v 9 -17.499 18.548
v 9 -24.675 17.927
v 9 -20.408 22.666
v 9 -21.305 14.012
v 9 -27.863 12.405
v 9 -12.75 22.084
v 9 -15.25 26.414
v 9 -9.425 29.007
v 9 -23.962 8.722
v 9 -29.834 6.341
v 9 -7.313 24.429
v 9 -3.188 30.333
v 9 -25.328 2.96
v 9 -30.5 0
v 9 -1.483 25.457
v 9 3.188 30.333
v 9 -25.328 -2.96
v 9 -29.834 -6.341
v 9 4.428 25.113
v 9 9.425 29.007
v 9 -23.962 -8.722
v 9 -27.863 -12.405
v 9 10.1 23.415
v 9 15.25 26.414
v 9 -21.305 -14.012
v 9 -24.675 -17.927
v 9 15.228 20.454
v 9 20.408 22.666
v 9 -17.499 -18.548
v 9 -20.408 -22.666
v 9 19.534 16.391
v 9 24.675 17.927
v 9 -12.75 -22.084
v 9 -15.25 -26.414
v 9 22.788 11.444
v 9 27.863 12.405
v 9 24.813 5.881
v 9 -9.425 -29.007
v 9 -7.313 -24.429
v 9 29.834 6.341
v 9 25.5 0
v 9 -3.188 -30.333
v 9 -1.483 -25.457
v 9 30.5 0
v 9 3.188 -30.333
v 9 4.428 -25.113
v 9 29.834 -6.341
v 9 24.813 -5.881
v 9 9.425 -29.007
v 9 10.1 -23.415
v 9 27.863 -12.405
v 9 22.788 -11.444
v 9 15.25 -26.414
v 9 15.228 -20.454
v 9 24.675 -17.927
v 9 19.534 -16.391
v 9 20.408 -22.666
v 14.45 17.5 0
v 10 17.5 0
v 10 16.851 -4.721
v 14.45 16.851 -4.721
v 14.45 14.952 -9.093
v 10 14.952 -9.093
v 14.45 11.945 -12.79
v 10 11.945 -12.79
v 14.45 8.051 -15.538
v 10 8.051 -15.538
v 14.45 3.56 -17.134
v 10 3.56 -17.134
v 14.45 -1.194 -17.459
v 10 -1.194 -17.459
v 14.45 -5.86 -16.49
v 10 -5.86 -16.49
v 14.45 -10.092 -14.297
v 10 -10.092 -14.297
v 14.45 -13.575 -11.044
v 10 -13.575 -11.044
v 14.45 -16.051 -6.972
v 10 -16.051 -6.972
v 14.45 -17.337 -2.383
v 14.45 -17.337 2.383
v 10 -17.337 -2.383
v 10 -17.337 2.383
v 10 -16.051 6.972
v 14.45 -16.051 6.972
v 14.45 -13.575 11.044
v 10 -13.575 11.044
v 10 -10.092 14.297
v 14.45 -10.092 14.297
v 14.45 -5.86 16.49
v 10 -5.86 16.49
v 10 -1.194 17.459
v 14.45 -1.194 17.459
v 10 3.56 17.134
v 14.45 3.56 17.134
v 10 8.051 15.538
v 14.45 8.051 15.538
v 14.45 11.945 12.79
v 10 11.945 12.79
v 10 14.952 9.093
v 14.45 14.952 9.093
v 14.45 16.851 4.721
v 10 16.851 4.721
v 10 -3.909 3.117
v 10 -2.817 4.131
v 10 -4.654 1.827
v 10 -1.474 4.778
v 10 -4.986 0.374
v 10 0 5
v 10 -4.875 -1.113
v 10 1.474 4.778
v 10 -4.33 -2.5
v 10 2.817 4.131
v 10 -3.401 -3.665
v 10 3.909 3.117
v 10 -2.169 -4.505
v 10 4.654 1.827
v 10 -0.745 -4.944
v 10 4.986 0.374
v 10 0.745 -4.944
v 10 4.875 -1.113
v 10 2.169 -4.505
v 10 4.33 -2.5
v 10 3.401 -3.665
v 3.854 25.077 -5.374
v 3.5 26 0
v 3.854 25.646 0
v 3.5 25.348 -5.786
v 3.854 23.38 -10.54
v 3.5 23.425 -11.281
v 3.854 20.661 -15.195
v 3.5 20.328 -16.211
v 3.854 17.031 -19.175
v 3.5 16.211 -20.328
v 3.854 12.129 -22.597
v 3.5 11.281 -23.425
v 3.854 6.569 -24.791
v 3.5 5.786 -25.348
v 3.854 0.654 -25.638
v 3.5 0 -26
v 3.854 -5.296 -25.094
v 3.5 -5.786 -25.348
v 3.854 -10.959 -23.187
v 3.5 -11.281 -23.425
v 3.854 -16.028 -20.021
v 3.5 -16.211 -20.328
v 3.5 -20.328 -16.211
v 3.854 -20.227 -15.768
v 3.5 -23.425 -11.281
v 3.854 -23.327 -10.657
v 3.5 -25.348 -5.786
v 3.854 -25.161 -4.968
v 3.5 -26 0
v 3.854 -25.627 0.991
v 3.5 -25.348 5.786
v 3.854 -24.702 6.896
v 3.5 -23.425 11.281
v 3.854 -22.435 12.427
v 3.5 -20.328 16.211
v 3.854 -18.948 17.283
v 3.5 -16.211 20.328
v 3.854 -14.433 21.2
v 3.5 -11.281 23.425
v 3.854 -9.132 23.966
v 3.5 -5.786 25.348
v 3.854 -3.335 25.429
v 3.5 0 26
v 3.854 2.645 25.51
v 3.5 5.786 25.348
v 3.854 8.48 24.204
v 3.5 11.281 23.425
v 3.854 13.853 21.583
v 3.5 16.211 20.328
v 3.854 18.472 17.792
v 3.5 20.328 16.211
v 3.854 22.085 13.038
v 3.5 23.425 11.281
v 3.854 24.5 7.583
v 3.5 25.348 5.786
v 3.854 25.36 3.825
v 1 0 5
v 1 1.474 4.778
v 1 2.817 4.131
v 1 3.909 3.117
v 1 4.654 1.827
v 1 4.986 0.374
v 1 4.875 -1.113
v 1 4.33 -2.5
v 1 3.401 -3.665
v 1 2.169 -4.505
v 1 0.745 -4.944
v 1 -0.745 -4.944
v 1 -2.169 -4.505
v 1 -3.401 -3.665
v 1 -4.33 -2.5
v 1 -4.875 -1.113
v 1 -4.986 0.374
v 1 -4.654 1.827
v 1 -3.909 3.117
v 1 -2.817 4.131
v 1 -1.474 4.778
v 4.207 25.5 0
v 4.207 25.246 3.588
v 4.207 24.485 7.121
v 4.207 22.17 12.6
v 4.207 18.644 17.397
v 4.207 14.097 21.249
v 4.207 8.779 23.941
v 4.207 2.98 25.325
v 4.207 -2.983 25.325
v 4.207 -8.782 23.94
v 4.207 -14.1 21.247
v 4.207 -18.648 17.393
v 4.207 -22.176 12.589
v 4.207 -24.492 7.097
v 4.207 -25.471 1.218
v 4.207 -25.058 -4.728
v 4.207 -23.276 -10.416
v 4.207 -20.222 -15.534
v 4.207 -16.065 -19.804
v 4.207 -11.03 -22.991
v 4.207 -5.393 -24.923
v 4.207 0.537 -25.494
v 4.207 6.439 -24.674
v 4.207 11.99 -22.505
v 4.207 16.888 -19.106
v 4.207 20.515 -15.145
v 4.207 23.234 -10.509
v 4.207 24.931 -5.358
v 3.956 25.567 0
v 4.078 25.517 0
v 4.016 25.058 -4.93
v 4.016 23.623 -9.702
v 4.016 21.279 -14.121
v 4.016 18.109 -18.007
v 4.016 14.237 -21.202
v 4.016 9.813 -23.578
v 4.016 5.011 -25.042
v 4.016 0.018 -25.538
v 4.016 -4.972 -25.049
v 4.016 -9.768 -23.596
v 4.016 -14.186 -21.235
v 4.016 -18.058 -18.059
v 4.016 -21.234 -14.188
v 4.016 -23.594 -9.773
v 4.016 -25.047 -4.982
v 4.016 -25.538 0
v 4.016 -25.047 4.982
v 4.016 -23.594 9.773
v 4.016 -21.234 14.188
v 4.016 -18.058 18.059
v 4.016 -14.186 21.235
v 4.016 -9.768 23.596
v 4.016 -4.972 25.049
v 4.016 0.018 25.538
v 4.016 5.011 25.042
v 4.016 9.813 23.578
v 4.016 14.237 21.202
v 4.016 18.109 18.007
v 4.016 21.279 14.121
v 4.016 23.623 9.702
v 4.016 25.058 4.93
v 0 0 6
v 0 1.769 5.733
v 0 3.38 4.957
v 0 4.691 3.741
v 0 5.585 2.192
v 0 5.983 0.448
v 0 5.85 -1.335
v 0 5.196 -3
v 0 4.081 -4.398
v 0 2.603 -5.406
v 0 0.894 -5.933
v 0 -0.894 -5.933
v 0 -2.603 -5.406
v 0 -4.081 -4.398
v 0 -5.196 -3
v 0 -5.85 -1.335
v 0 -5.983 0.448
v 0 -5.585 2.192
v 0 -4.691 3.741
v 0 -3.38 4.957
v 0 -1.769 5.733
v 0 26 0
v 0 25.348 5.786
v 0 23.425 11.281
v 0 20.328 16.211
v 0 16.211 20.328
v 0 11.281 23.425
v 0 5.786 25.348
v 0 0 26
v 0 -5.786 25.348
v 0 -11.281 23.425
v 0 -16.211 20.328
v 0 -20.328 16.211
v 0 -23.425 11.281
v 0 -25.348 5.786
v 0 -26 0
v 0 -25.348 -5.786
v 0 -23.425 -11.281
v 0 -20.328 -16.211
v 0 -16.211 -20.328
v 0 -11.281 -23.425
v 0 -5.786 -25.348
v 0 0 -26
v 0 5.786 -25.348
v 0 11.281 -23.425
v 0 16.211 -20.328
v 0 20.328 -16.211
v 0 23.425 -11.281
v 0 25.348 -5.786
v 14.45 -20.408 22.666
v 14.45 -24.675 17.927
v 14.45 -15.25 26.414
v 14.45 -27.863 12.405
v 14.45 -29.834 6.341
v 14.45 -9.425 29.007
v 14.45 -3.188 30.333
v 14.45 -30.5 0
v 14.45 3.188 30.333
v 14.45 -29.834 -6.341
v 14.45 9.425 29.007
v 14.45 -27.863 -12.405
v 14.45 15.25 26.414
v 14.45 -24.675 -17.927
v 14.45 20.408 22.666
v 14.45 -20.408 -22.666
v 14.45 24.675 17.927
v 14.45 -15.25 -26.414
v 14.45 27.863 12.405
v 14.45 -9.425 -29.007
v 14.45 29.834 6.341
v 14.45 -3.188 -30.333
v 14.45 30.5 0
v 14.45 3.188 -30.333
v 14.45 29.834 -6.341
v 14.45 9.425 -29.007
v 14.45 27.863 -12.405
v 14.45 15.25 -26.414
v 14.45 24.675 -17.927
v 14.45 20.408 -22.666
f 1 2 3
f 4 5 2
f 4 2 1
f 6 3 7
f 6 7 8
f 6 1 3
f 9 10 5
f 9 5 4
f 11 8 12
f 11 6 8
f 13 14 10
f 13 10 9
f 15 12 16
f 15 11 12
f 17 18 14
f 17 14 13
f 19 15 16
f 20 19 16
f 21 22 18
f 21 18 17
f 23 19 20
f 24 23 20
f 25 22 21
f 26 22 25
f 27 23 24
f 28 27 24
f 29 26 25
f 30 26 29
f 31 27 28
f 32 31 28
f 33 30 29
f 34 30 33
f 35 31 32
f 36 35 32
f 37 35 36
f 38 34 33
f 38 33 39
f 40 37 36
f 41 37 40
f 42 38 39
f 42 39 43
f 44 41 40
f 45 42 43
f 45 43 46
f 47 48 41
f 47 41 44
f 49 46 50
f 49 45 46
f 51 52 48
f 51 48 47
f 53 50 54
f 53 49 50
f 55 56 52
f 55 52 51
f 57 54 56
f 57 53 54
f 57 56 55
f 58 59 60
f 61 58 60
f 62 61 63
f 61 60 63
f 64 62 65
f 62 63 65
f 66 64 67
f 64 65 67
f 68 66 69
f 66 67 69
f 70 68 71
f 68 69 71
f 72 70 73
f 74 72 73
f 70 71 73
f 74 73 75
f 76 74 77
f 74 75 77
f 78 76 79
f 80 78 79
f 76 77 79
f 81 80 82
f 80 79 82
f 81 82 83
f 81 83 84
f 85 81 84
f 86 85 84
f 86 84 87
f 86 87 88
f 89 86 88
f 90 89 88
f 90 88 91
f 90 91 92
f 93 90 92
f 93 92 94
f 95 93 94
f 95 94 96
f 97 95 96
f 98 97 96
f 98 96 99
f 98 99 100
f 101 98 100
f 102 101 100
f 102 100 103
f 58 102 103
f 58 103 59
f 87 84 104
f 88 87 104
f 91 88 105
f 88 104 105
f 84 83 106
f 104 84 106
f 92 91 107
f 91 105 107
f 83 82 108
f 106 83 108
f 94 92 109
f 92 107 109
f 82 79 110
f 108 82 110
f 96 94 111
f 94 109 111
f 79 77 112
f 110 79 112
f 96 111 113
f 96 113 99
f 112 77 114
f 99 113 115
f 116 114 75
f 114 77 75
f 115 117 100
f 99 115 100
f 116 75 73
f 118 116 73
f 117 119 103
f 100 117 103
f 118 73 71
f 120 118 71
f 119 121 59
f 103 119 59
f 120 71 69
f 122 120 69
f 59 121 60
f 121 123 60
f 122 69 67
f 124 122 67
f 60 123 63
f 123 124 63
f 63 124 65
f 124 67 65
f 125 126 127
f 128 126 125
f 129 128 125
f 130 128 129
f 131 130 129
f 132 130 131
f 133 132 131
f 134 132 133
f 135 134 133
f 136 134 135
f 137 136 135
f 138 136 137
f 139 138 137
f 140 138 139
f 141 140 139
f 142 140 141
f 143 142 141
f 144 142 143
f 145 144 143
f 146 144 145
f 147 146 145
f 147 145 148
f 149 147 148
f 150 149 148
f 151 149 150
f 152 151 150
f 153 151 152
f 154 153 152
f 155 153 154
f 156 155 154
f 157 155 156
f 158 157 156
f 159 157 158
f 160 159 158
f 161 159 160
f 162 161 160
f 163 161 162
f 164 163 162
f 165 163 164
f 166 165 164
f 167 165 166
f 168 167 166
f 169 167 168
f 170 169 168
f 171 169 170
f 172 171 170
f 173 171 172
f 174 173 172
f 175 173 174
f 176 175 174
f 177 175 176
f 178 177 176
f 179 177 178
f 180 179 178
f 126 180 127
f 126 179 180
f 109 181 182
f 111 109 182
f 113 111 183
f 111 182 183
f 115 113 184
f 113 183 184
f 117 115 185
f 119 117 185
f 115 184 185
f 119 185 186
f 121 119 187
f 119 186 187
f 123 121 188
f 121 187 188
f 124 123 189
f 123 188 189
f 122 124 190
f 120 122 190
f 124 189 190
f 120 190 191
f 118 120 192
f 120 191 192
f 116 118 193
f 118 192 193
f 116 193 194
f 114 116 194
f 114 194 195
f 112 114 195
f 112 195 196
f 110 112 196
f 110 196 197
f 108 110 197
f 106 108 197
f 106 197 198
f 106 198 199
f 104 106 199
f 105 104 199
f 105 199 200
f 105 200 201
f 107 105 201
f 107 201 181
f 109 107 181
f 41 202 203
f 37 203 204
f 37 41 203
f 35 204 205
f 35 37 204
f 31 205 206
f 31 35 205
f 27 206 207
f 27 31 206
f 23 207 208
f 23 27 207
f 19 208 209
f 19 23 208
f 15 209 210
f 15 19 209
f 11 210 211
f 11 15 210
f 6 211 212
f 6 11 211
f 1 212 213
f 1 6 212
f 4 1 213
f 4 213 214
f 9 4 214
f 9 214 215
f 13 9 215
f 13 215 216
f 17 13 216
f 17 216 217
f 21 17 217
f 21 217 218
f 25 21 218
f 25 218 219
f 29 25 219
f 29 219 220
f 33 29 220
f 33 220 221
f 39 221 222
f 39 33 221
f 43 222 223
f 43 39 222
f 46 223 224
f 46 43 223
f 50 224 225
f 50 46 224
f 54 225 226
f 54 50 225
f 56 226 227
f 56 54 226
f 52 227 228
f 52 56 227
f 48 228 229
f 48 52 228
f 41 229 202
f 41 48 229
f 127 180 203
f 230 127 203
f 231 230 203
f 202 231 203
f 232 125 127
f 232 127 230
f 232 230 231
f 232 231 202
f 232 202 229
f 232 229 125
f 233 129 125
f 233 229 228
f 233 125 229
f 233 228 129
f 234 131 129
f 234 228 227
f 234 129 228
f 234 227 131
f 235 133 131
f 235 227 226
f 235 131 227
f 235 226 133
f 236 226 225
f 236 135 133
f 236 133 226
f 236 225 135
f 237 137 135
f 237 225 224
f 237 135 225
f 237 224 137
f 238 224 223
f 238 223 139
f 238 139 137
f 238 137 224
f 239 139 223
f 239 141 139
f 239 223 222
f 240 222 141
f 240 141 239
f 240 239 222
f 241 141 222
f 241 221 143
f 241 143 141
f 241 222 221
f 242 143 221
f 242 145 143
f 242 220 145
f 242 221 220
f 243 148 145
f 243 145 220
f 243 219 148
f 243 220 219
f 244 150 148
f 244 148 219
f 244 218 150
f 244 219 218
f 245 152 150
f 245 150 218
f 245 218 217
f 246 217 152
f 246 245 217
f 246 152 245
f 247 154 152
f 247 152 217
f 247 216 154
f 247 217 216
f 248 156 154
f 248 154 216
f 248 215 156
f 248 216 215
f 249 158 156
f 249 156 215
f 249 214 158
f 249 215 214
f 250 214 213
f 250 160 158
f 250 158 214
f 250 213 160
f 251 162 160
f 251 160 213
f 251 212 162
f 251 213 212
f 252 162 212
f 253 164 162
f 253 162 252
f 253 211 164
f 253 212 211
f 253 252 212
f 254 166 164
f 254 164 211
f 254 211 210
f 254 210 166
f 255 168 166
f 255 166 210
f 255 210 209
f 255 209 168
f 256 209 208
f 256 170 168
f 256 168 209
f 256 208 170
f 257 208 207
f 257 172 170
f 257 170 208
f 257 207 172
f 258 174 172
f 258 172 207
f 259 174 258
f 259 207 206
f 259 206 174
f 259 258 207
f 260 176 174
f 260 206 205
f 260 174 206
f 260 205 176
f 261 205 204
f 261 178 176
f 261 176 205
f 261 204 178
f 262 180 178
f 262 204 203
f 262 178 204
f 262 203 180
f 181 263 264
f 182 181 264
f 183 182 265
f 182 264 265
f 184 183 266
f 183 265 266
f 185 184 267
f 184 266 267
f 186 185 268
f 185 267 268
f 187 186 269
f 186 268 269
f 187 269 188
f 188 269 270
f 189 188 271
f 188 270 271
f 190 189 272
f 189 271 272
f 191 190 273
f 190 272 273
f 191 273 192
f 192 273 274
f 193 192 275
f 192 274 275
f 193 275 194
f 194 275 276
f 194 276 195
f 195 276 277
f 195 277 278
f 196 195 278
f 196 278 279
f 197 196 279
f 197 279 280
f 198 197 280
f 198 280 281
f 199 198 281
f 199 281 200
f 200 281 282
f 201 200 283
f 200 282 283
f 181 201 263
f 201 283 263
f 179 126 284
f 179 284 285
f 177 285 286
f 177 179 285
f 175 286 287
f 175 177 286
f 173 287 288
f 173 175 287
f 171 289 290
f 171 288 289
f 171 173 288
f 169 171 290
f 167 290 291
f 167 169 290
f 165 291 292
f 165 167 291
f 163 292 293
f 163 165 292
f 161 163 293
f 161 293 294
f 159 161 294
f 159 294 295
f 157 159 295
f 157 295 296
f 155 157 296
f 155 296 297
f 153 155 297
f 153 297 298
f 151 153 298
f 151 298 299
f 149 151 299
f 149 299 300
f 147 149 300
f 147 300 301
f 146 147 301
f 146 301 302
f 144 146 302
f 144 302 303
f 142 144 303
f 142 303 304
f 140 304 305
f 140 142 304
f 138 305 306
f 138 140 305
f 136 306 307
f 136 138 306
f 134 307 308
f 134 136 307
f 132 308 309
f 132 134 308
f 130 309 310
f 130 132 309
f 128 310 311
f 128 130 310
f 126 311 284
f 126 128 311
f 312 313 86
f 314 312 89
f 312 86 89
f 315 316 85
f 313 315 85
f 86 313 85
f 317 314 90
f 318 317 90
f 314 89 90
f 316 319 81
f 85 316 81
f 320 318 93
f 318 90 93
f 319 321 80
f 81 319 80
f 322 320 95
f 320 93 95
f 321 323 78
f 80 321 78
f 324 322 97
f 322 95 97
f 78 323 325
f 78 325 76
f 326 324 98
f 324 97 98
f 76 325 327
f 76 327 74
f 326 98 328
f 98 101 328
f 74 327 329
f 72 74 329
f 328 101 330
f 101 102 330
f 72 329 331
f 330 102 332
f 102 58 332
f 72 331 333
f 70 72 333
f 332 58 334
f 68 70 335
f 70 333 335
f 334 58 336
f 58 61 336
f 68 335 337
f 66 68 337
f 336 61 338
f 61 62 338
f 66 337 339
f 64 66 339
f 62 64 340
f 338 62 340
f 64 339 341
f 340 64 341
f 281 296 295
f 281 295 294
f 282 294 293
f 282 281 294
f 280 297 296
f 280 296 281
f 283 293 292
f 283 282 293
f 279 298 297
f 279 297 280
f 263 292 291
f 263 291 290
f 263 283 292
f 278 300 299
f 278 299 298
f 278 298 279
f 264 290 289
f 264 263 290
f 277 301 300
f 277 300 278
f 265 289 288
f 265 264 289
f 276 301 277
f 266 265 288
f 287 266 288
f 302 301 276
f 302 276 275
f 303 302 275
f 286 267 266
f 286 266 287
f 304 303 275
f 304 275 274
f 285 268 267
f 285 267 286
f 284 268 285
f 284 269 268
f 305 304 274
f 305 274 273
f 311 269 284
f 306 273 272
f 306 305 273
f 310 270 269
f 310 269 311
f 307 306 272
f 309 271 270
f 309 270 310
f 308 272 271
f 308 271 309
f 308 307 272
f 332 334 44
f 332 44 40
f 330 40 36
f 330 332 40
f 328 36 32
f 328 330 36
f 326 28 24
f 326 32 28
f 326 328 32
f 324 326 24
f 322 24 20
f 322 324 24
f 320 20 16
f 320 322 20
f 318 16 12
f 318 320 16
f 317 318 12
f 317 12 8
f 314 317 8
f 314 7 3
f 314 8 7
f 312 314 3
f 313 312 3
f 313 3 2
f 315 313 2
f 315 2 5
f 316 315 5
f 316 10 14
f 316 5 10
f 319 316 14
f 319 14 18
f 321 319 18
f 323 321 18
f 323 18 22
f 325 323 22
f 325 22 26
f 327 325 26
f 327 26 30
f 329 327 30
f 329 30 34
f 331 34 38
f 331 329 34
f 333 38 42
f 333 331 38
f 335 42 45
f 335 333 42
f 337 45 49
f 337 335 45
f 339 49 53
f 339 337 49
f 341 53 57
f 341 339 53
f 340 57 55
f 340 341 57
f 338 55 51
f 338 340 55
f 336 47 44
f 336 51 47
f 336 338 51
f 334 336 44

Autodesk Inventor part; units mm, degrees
ref_plane "YZ Plane" through (0, 0, 0) normal (1, 0, 0) x (0, 1, 0)
ref_plane "XZ Plane" through (0, 0, 0) normal (0, 1, 0) x (-1, 0, 0)
ref_plane "XY Plane" through (0, 0, 0) normal (0, 0, 1) x (1, 0, 0)
sketch "Эскиз1" plane through (0, 0, 0) normal (0, 0, 1) x (1, 0, 0)
  line L0 (0, 0) -> (0, 26)
  line L1 (9, 26.1456) -> (9, 30.5)
  line L2 (9, 30.5) -> (14.45, 30.5)
  line L3 (14.45, 30.5) -> (14.45, 17.5)
  line L4 (14.45, 17.5) -> (10, 17.5)
  line L5 (10, 17.5) -> (10, 0)
  line L6 (10, 0) -> (0, 0)
  line L7 (0, 26) -> (3.5, 26)
  line L8 (3.5, 26) -> (4, 25.5)
  line L9 (4, 25.5) -> (9, 25.5)
  line L10 (9, 25.5) -> (9, 26.1456)
  dimension "d1" = 52
  dimension "d2" = 0.5
  dimension "d3" = 45
  dimension "d4" = 5
  dimension "d5" = 14.45
  dimension "d6" = 10
  dimension "d7" = 35
  dimension "d8" = 4.5
  dimension "d23" = 9
revolve "Вращение1" add sketch "Эскиз1" angle 360 about axis through (10, 0, 0) along (-1, 0, 0)
sketch "Эскиз2" plane through (0, 0, 0) normal (-1, 0, 0) x (0, 0, 1)
  circle A0 centre (0, 0) radius 26 projected
  circle A1 centre (0, 0) radius 10
  circle A2 centre (0, 0) radius 5
  point P0 (0, 0)
  dimension "d10" = 20
  dimension "d11" = 10
extrude "Выдавливание1" cut sketch "Эскиз2" against normal through all contours A2
fillet "Сопряжение2" radius 0.5 1 edges at (4, -25.5, 0)
chamfer "Фаска2" distance 1 angle 45 1 edges at (0, 0, -5)
thread "Резьба3" size "M10x0.5" class "6H" standard "ANSI Metric M Profile" length 10
properties part number "Крышка_пром_новая"
